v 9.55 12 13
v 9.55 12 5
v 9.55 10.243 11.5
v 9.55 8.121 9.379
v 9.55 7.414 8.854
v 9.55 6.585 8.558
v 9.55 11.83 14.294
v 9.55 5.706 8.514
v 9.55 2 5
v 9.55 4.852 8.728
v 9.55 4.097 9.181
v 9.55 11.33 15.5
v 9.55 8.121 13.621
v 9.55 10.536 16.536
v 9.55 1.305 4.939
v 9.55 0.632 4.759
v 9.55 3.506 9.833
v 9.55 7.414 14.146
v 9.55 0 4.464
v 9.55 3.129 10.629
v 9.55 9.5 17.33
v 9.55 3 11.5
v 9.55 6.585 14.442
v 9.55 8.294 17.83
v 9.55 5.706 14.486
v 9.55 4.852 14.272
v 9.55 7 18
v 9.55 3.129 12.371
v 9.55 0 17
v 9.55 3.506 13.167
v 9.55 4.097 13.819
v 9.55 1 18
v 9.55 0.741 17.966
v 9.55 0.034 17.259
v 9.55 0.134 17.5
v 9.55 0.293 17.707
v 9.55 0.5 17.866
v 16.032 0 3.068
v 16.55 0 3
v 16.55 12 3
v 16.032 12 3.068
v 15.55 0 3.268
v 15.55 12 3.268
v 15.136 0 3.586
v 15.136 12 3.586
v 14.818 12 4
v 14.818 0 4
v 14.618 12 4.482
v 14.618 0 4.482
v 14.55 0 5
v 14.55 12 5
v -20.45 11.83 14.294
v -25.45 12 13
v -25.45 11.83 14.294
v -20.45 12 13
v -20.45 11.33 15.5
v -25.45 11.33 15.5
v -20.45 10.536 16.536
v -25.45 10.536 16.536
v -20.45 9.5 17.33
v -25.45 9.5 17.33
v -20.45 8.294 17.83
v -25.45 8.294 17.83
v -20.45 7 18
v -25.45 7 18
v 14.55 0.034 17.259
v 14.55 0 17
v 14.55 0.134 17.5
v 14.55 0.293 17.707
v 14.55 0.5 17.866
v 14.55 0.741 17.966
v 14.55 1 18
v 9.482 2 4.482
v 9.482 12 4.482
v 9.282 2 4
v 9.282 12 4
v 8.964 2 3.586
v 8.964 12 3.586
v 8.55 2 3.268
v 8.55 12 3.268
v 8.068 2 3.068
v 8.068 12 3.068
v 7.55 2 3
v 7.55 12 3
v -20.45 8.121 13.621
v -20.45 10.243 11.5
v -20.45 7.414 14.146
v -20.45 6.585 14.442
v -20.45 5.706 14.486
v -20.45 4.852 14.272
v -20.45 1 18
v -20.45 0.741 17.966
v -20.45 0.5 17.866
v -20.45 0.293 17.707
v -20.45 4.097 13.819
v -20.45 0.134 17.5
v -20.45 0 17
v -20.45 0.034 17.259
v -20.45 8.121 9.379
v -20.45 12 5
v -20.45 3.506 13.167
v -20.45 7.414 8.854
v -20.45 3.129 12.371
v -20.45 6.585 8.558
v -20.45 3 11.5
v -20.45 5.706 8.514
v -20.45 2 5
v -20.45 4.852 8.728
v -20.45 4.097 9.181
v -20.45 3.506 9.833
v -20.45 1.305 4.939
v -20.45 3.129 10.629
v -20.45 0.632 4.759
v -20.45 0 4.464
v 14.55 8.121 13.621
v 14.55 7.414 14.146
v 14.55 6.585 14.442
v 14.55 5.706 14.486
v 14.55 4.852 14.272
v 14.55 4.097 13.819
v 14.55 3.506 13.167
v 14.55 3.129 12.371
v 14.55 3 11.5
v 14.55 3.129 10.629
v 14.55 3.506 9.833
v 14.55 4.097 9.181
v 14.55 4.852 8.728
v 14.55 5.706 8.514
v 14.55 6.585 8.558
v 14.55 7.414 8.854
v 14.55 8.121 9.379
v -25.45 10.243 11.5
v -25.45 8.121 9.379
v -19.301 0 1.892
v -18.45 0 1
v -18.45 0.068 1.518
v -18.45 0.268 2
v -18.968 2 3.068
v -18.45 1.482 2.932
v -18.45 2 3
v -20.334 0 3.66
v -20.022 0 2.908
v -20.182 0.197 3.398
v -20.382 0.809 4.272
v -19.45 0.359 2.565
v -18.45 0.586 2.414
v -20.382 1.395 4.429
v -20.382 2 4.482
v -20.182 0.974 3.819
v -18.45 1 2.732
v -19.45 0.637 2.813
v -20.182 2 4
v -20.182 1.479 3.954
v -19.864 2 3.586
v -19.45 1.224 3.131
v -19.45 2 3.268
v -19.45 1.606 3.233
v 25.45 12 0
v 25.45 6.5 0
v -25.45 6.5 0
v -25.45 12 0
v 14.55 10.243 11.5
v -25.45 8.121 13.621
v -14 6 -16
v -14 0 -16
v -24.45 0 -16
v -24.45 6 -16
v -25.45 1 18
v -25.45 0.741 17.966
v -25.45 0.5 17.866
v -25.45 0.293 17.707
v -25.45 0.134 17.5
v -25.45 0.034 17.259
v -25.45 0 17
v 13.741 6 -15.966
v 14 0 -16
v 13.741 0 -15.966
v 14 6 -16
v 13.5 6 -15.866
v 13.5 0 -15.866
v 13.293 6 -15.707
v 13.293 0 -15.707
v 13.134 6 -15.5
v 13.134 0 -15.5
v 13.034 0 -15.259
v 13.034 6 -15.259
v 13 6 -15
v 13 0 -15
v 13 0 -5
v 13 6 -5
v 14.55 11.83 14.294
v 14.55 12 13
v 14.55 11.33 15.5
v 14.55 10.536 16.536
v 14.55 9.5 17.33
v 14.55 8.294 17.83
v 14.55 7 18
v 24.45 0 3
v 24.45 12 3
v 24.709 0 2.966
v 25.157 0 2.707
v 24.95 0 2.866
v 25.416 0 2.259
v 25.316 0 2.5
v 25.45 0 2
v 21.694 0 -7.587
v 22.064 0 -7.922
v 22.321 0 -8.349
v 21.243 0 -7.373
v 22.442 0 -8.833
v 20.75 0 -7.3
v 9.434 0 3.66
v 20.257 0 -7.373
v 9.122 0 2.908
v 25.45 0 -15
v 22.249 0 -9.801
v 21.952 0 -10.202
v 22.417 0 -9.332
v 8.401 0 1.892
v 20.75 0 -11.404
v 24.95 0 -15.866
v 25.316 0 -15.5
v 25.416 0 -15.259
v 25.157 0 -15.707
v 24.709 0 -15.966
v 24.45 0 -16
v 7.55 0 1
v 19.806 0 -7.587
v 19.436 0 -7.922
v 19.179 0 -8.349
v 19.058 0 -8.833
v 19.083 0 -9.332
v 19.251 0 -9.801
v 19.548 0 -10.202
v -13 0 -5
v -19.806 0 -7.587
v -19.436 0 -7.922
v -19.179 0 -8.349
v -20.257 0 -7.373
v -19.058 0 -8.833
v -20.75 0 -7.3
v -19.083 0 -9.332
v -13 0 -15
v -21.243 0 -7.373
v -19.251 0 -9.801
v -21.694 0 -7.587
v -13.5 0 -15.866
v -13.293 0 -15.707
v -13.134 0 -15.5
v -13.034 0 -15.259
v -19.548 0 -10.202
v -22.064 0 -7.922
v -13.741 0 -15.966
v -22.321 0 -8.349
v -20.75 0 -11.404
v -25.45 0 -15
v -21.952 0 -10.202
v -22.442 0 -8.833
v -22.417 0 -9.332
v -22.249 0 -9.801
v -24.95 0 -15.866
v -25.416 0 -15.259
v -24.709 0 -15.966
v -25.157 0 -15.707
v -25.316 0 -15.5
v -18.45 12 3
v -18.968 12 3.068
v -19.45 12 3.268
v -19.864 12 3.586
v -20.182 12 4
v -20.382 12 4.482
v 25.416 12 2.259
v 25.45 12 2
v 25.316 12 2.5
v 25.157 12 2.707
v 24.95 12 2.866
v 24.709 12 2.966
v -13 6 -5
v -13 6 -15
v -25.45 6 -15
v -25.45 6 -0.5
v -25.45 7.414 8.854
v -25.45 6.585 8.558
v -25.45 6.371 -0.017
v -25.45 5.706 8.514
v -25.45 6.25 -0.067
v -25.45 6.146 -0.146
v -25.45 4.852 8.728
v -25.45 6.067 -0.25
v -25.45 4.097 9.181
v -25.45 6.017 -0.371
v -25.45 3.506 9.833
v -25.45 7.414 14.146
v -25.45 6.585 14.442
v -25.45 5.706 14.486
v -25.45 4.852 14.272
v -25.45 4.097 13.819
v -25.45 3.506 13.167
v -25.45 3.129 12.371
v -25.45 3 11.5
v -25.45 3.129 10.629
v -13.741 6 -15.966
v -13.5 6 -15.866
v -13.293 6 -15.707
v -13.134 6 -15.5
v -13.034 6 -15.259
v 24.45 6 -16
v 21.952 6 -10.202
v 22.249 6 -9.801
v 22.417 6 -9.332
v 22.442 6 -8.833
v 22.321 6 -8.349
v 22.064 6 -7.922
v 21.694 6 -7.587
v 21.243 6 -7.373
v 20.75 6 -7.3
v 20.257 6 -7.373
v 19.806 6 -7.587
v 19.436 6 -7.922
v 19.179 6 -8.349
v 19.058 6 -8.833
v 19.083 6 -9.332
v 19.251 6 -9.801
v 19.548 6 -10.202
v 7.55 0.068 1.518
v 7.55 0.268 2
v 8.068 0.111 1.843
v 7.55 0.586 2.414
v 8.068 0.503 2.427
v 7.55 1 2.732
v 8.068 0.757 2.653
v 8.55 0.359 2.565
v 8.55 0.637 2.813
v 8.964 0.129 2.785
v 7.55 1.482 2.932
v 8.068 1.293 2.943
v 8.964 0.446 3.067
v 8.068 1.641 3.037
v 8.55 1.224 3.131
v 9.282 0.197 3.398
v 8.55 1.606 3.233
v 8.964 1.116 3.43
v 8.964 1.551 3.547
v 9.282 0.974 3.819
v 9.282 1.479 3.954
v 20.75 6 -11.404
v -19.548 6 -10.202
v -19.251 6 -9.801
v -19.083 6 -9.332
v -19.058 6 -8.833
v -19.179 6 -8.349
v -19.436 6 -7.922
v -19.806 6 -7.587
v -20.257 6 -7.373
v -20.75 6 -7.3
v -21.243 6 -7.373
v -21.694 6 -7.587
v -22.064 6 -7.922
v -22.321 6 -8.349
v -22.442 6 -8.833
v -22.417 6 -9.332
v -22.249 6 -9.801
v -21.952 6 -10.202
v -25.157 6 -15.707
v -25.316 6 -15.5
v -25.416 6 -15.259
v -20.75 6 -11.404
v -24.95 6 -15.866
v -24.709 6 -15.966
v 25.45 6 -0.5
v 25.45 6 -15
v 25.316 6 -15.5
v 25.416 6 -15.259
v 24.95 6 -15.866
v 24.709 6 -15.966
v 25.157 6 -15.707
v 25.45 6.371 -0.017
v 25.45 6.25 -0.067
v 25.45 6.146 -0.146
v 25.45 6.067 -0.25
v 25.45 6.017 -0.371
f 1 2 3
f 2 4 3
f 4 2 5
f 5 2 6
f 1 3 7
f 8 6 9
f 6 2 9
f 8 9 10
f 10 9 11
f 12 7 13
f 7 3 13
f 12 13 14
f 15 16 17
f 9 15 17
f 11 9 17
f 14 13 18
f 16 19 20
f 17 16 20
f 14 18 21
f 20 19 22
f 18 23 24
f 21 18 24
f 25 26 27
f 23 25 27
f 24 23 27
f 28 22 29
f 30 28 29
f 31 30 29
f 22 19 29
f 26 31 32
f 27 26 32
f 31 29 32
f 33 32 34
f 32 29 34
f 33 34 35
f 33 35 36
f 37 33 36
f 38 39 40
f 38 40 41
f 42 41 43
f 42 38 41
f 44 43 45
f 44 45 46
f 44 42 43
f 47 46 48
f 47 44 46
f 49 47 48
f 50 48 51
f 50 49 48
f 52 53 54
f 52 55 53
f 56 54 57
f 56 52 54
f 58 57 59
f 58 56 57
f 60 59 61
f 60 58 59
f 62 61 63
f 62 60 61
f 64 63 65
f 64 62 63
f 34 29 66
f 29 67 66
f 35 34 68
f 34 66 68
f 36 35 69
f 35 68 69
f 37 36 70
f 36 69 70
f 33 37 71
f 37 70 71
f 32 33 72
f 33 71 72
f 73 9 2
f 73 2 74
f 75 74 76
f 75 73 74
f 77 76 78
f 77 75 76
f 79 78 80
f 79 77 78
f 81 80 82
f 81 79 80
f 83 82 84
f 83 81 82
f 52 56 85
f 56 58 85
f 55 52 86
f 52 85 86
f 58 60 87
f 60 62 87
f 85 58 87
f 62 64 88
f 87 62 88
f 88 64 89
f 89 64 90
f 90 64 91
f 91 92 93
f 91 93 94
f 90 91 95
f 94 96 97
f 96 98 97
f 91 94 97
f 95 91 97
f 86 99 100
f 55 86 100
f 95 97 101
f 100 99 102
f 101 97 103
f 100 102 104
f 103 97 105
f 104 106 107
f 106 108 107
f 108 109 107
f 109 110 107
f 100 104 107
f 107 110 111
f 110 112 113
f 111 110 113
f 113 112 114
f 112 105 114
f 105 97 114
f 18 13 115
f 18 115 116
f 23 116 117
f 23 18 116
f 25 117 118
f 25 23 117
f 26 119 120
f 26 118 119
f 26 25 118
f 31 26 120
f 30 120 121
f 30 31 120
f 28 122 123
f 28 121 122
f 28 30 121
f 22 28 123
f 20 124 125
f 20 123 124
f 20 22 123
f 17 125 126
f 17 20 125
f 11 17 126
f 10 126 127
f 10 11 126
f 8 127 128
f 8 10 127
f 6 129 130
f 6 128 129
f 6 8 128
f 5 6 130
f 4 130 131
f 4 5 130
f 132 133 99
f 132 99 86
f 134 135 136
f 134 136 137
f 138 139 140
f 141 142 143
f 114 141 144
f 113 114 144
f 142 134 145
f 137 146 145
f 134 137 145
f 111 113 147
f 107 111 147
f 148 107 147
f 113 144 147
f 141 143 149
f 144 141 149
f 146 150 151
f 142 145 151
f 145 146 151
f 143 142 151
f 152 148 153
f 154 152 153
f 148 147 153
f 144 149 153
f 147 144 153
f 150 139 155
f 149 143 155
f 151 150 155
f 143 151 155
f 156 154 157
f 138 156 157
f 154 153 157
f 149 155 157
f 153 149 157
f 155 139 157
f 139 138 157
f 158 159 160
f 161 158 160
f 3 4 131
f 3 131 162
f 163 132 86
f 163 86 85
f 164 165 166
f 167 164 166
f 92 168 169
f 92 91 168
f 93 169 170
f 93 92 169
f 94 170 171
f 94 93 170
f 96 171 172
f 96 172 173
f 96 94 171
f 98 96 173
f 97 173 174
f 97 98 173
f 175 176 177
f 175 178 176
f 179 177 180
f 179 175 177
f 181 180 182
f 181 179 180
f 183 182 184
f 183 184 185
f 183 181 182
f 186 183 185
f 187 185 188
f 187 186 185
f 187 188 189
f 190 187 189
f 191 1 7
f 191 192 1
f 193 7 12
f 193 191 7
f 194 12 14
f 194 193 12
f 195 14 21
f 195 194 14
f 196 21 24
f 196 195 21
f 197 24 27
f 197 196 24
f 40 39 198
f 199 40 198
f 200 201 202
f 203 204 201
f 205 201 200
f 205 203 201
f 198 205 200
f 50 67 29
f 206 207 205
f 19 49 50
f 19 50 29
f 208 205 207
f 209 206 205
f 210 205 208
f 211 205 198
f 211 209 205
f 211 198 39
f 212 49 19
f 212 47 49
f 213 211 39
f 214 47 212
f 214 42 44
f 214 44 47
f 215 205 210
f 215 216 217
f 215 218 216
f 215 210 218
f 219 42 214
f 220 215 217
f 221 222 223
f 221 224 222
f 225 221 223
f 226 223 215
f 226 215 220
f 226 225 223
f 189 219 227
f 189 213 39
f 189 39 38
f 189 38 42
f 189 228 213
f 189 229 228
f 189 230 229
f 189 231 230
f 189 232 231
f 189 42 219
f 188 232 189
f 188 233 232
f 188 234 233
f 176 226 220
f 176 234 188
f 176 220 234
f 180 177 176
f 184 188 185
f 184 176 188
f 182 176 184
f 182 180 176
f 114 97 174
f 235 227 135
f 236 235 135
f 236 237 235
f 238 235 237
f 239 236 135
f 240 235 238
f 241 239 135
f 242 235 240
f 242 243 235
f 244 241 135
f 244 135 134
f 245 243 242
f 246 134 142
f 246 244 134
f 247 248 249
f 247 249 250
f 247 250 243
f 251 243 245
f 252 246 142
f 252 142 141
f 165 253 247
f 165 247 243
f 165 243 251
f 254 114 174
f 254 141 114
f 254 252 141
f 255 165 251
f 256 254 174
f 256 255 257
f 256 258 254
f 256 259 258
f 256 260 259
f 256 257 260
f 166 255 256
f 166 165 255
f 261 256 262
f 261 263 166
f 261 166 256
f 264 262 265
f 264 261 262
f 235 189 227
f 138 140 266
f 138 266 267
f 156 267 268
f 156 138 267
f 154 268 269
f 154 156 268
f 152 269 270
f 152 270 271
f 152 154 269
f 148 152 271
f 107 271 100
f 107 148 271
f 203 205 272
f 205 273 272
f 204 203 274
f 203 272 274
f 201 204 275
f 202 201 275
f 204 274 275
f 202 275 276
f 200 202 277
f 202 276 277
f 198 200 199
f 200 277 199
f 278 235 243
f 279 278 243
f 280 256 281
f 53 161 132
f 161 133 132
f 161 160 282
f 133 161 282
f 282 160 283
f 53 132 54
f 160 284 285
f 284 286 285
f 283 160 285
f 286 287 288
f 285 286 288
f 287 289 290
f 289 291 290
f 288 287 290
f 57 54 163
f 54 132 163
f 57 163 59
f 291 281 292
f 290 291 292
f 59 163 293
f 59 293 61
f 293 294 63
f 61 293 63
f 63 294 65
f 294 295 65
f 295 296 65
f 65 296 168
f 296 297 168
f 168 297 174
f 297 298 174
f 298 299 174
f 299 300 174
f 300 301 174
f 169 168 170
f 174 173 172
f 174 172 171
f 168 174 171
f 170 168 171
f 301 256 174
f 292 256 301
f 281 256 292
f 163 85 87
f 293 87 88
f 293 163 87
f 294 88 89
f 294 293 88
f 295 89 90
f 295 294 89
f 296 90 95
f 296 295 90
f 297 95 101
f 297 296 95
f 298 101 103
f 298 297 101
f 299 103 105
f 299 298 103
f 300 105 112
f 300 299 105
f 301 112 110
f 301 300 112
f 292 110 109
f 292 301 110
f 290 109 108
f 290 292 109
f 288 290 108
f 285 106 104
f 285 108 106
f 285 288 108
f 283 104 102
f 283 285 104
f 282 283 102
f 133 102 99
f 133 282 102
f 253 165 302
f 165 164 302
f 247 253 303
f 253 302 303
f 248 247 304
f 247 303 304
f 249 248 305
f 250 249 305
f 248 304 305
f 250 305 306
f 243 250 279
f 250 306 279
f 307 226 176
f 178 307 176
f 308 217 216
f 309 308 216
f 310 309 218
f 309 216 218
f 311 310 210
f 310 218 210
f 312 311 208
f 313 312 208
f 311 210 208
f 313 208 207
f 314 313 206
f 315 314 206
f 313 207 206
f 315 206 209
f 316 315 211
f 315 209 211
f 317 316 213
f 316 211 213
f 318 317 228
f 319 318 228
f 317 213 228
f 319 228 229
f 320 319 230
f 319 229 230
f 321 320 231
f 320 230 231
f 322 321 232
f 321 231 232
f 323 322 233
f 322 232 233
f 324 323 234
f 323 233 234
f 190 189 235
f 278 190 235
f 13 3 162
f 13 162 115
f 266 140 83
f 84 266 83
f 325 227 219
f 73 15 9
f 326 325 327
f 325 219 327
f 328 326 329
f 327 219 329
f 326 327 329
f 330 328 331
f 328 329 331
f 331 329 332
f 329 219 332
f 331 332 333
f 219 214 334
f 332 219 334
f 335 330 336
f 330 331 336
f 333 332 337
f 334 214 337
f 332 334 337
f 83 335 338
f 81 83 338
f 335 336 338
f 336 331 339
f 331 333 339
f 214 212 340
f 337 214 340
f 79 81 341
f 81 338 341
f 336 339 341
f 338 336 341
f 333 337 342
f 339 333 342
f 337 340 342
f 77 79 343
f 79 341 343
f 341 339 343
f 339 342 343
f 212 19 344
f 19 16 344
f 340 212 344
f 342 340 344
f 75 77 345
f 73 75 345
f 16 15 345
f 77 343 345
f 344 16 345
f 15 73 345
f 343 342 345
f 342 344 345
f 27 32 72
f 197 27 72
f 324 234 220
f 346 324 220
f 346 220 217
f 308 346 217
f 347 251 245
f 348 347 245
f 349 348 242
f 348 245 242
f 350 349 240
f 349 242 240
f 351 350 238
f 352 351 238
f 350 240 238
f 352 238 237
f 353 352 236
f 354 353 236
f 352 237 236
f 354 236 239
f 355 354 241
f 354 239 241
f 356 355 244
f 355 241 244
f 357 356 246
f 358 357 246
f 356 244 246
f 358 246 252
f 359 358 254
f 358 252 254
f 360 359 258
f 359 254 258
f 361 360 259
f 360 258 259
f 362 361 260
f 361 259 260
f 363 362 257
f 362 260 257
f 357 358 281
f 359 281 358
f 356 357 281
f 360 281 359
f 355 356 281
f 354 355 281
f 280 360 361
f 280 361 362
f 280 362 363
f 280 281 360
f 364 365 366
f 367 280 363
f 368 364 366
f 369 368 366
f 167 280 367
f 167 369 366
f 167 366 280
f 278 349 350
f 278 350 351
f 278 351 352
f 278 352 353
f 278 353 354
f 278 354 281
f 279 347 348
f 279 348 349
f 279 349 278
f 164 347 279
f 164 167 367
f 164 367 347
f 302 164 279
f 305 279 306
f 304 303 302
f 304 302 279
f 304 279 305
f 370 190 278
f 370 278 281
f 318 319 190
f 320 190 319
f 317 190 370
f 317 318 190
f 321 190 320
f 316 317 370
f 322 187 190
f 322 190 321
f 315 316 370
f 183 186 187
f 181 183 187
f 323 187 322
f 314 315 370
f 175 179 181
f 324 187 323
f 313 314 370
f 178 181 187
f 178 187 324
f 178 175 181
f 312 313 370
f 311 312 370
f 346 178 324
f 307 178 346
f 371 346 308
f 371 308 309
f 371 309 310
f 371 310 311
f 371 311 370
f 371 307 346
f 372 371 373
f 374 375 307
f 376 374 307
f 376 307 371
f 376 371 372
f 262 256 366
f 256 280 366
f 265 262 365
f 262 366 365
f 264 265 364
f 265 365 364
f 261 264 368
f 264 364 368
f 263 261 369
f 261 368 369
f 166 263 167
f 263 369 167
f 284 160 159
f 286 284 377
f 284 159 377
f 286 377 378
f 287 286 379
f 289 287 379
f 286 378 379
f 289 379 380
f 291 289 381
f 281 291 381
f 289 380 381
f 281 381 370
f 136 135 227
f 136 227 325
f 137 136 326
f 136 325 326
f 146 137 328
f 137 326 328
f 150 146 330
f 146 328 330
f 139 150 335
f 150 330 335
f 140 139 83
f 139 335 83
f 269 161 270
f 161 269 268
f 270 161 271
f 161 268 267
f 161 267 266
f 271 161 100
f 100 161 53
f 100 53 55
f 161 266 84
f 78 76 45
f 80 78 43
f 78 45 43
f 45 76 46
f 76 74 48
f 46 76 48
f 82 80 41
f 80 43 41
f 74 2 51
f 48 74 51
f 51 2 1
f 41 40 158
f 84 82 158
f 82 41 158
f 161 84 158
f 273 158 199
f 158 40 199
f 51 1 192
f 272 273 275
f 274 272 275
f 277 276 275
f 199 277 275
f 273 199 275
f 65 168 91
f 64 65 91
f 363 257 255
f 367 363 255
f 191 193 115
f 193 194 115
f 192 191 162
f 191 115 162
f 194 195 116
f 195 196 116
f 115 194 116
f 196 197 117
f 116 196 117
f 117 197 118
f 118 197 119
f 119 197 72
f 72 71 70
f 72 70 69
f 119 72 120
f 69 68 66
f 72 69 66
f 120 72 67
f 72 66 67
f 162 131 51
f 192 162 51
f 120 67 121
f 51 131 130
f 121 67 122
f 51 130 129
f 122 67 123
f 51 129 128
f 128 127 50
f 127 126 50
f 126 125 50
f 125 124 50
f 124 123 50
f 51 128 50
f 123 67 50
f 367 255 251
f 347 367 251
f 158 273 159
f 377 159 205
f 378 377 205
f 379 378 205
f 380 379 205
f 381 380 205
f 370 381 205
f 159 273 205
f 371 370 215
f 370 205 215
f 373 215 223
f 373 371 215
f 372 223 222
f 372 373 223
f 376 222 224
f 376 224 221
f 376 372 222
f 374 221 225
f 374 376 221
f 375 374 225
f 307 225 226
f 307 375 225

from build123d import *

# Parameters (mm, degrees)
BOSS_EXTRUDE2_DEPTH = 6
BOSS_EXTRUDE4_DEPTH = 12
CUT_EXTRUDE4_DEPTH  = 56.306509563
FILLET3_R           = 5
FILLET7_R           = 2
FILLET4_R           = 2
FILLET5_R           = 0.5
FILLET6_R           = 1


with BuildPart() as part:
    # Sketch1 → Boss-Extrude2 (new body)
    with BuildSketch(Plane(origin=(0, 0, 0), x_dir=(1, 0, 0), z_dir=(0, 1, 0))):
        Polygon((13, 5), (-13, 5), (-13, 16), (-25.45, 16), (-25.45, 0), (25.45, 0), (25.45, 16), (13, 16), align=None)
        with BuildLine():
            ThreePointArc((-19.547918472, 10.202081528), (-20.75, 7.3), (-21.952081528, 10.202081528))
            Line((-21.952081528, 10.202081528), (-20.75, 11.404163056))
            Line((-20.75, 11.404163056), (-19.547918472, 10.202081528))
        make_face(mode=Mode.SUBTRACT)
        with BuildLine():
            Line((20.75, 11.404163056), (21.952081528, 10.202081528))
            ThreePointArc((21.952081528, 10.202081528), (20.75, 7.3), (19.547918472, 10.202081528))
            Line((19.547918472, 10.202081528), (20.75, 11.404163056))
        make_face(mode=Mode.SUBTRACT)
    extrude(amount=BOSS_EXTRUDE2_DEPTH)

    # Sketch1<4> → Boss-Extrude4 (add)
    with BuildSketch(Plane(origin=(0, 0, 0), x_dir=(1, 0, 0), z_dir=(0, 1, 0))):
        Polygon((25.45, 0), (-25.45, 0), (-25.45, -18), (-20.45, -18), (-20.45, -3), (9.55, -3), (9.55, -18), (14.55, -18), (14.55, -3), (25.45, -3), align=None)
    extrude(amount=BOSS_EXTRUDE4_DEPTH)

    # Sketch9 → Cut-Extrude4 (cut, through all)
    with BuildSketch(Plane.ZY.offset(25.45)):
        with BuildLine():
            Line((9.378679656, 8.121320344), (11.5, 10.242640687))
            Line((11.5, 10.242640687), (13.621320344, 8.121320344))
            ThreePointArc((13.621320344, 8.121320344), (11.5, 3), (9.378679656, 8.121320344))
        make_face()
    extrude(amount=-CUT_EXTRUDE4_DEPTH, mode=Mode.SUBTRACT)

    # Fillet3
    fillet3_edges = [part.edges().sort_by_distance(p)[0] for p in [
        (-22.95, 12, 18),
        (12.05, 12, 18),
    ]]
    fillet(fillet3_edges, radius=FILLET3_R)

    # Fillet7
    fillet7_edges = [part.edges().sort_by_distance(p)[0] for p in [
        (-5.45, 0, 3),
    ]]
    fillet(fillet7_edges, radius=FILLET7_R)

    # Fillet4
    # the kernel refuses this fillet: 2 mm, written as the material it adds along each edge
    with BuildSketch(Plane(origin=(9.55, 2, 1), x_dir=(0, 0.8017442392976483, -0.5976672776328277), z_dir=(0, 0.5976672776328277, 0.8017442392976483))) as fillet4_piece_1_section:
        with BuildLine():
            CenterArc((2 + FILLET4_R, FILLET4_R), FILLET4_R, 180, 90)
            Line((2, FILLET4_R), (2, 0))
            Line((2, 0), (2 + FILLET4_R, 0))
        make_face()
    fillet4_piece_1 = revolve(axis=Axis((9.55, 2, 1), (-1, 0, 0)), revolution_arc=233.296989237, mode=Mode.PRIVATE)
    fillet4_piece_1 = split(fillet4_piece_1, bisect_by=Plane(origin=(8.926743459, 0, 2.499877942), z_dir=(0, 1, 0)), keep=Keep.TOP, mode=Mode.PRIVATE)
    add(fillet4_piece_1)
    with BuildSketch(Plane(origin=(-20.45, 2, 1), x_dir=(0, 0.8017442392976483, -0.5976672776328277), z_dir=(0, 0.5976672776328277, 0.8017442392976483))) as fillet4_piece_2_section:
        with BuildLine():
            CenterArc((2 + FILLET4_R, -FILLET4_R), FILLET4_R, 90, 90)
            Line((2 + FILLET4_R, 0), (2, 0))
            Line((2, 0), (2, -FILLET4_R))
        make_face()
    fillet4_piece_2 = revolve(axis=Axis((-20.45, 2, 1), (-1, 0, 0)), revolution_arc=233.296989237, mode=Mode.PRIVATE)
    fillet4_piece_2 = split(fillet4_piece_2, bisect_by=Plane(origin=(-19.826743524, 0, 2.499877995), z_dir=(0, 1, 0)), keep=Keep.TOP, mode=Mode.PRIVATE)
    add(fillet4_piece_2)
    with BuildSketch(Plane(origin=(14.55, 0, 3), x_dir=(1, 0, 0), z_dir=(0, 1, 0))) as fillet4_piece_3:
        with BuildLine():
            CenterArc((FILLET4_R, -FILLET4_R), FILLET4_R, 90, 90)
            Line((0, -FILLET4_R), (0, 0))
            Line((0, 0), (FILLET4_R, 0))
        make_face()
    extrude(amount=12)
    with BuildSketch(Plane(origin=(-20.45, 2, 3), x_dir=(1, 0, 0), z_dir=(0, 1, 0))) as fillet4_piece_4:
        with BuildLine():
            CenterArc((FILLET4_R, -FILLET4_R), FILLET4_R, 90, 90)
            Line((0, -FILLET4_R), (0, 0))
            Line((0, 0), (FILLET4_R, 0))
        make_face()
    extrude(amount=10)
    with BuildSketch(Plane(origin=(9.55, 2, 3), x_dir=(-1, 0, 0), z_dir=(0, 1, 0))) as fillet4_piece_5:
        with BuildLine():
            CenterArc((FILLET4_R, FILLET4_R), FILLET4_R, 180, 90)
            Line((0, FILLET4_R), (0, 0))
            Line((0, 0), (FILLET4_R, 0))
        make_face()
    extrude(amount=10)

    # Fillet5
    fillet5_edges = [part.edges().sort_by_distance(p)[0] for p in [
        (0, 6, 0),
    ]]
    fillet(fillet5_edges, radius=FILLET5_R)

    # Fillet6
    fillet6_edges = [part.edges().sort_by_distance(p)[0] for p in [
        (-25.45, 3, -16),
        (-13, 3, -16),
        (13, 3, -16),
        (25.45, 3, -16),
        (25.45, 6, 3),
        (-22.95, 0, 18),
        (12.05, 0, 18),
    ]]
    fillet(fillet6_edges, radius=FILLET6_R)


solid = part.part
